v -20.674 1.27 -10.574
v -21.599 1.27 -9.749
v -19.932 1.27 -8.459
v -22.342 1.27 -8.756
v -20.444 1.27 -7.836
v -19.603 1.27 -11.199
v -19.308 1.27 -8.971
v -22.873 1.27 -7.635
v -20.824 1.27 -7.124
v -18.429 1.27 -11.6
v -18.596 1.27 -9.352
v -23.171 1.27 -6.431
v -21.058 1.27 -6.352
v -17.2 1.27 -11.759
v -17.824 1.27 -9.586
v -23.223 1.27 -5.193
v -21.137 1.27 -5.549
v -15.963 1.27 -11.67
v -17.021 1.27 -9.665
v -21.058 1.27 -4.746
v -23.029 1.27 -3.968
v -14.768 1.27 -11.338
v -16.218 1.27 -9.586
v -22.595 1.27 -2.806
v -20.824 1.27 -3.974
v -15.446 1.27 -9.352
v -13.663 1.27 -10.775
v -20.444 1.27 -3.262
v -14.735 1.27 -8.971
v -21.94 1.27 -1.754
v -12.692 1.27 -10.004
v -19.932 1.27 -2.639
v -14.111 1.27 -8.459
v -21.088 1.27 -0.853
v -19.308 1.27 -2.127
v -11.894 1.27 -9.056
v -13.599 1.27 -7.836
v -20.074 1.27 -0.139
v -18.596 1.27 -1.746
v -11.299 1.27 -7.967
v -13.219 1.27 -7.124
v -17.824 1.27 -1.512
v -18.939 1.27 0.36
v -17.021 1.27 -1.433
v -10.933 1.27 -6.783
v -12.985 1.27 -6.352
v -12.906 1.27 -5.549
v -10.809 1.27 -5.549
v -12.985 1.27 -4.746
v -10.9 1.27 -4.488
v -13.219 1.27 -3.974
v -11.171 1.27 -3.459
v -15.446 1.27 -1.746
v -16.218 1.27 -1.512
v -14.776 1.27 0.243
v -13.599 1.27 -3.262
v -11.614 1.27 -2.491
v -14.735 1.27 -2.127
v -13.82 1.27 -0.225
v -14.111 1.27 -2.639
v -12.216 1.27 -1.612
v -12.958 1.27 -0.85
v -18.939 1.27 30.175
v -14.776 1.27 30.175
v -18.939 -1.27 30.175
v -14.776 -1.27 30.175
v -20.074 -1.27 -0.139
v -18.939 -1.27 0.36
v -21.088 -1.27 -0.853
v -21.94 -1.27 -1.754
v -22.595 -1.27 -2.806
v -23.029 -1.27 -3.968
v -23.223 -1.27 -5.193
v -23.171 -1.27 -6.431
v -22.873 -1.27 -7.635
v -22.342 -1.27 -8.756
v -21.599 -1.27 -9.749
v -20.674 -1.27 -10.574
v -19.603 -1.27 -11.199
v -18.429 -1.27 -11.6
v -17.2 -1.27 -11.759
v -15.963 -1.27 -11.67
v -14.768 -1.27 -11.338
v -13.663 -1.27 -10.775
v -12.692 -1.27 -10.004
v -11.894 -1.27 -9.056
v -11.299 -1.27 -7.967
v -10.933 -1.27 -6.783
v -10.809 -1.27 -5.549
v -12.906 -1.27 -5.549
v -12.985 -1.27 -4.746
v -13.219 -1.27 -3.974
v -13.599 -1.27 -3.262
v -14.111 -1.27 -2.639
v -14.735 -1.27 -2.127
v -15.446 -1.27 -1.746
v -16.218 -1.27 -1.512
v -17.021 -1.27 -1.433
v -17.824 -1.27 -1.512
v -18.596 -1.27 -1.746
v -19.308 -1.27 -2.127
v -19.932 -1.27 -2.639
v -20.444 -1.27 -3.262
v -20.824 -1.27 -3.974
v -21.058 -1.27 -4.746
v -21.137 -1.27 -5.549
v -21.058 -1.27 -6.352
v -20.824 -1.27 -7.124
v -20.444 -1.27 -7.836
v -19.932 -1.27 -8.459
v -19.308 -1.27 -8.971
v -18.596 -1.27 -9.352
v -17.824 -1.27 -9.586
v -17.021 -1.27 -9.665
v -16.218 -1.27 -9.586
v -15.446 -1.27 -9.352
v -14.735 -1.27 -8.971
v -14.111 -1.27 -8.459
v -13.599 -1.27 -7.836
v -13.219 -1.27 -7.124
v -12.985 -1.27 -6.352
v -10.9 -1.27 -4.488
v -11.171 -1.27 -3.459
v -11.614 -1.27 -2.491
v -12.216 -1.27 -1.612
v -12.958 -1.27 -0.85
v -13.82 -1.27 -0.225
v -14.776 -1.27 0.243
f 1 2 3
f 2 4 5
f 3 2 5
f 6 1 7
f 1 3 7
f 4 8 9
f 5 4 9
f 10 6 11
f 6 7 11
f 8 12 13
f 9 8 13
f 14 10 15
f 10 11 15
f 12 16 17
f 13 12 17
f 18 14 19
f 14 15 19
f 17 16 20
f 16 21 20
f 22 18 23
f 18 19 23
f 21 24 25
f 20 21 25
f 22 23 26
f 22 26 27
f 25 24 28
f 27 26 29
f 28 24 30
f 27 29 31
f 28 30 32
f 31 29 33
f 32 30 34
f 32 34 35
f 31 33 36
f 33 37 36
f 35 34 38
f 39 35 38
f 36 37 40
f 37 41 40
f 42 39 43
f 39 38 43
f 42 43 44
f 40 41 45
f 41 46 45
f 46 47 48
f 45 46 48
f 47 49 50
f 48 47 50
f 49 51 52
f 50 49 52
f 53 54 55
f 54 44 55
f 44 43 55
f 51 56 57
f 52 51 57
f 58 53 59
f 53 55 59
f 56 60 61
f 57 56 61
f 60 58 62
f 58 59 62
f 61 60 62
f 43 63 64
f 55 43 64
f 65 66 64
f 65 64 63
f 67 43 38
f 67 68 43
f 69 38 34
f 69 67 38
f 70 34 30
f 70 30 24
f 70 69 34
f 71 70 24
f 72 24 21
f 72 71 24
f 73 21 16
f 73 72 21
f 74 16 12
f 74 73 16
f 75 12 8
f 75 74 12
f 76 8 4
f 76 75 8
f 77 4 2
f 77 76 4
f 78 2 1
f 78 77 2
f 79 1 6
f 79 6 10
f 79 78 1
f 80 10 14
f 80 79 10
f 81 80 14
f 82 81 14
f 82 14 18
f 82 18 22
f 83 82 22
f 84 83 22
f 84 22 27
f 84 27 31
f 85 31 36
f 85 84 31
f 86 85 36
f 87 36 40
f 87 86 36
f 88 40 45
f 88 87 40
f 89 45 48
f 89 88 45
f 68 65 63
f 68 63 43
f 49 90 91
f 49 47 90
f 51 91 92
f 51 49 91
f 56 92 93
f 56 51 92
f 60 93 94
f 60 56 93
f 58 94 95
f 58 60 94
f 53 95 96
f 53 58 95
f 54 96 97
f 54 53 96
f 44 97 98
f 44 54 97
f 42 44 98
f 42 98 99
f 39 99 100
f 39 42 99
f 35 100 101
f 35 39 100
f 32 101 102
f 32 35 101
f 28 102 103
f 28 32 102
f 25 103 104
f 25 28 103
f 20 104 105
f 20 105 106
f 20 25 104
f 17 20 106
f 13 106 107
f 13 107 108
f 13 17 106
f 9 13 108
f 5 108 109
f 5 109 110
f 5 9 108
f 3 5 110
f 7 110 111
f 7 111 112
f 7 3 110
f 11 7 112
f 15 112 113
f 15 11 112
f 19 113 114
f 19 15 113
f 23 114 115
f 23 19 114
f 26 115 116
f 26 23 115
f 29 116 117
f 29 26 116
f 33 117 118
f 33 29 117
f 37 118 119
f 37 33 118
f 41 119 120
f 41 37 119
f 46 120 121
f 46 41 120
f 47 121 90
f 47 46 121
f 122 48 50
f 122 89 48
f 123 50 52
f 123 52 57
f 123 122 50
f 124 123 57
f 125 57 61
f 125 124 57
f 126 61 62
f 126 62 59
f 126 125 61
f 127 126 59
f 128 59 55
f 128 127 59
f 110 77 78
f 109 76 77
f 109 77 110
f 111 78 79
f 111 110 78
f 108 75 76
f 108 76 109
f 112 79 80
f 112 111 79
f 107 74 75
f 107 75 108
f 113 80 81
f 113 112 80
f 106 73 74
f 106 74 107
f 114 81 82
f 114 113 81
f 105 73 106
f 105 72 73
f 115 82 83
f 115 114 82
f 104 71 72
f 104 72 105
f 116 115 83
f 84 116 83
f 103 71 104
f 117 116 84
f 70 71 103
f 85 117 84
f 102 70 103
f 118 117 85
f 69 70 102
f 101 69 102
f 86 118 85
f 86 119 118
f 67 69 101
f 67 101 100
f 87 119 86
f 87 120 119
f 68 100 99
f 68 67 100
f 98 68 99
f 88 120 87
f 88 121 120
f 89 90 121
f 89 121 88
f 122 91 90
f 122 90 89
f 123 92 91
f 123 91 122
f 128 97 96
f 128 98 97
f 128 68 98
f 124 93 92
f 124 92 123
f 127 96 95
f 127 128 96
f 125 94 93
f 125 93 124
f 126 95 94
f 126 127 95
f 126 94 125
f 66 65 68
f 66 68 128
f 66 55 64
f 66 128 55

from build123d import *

# Parameters (mm, degrees)
F0_R     = 4.115829
F1_DEPTH = 1.27


with BuildPart() as f1:
    # F0 (on Front) → F1 (new body, symmetric)
    with BuildSketch(Plane.XZ):
        with BuildLine():
            ThreePointArc((-18.938706, 0.359932), (-16.847498, 0.660789), (-14.776399, 0.243397))
            Line((-14.776399, 0.243397), (-14.776399, 30.174541))
            Line((-14.776399, 30.174541), (-18.938706, 30.174541))
            Line((-18.938706, 30.174541), (-18.938706, 0.359932))
        make_face()
        with BuildLine():
            ThreePointArc((-18.938706, 0.359932), (-20.673798, -10.574059), (-10.809144, -5.548992))
            ThreePointArc((-10.809144, -5.548992), (-11.89604, -2.038619), (-14.776399, 0.243397))
            ThreePointArc((-14.776399, 0.243397), (-16.847498, 0.660789), (-18.938706, 0.359932))
        make_face()
        with Locations((-17.021358, -5.548992)):
            Circle(F0_R, mode=Mode.SUBTRACT)
    extrude(amount=F1_DEPTH, both=True)


solid = f1.part
